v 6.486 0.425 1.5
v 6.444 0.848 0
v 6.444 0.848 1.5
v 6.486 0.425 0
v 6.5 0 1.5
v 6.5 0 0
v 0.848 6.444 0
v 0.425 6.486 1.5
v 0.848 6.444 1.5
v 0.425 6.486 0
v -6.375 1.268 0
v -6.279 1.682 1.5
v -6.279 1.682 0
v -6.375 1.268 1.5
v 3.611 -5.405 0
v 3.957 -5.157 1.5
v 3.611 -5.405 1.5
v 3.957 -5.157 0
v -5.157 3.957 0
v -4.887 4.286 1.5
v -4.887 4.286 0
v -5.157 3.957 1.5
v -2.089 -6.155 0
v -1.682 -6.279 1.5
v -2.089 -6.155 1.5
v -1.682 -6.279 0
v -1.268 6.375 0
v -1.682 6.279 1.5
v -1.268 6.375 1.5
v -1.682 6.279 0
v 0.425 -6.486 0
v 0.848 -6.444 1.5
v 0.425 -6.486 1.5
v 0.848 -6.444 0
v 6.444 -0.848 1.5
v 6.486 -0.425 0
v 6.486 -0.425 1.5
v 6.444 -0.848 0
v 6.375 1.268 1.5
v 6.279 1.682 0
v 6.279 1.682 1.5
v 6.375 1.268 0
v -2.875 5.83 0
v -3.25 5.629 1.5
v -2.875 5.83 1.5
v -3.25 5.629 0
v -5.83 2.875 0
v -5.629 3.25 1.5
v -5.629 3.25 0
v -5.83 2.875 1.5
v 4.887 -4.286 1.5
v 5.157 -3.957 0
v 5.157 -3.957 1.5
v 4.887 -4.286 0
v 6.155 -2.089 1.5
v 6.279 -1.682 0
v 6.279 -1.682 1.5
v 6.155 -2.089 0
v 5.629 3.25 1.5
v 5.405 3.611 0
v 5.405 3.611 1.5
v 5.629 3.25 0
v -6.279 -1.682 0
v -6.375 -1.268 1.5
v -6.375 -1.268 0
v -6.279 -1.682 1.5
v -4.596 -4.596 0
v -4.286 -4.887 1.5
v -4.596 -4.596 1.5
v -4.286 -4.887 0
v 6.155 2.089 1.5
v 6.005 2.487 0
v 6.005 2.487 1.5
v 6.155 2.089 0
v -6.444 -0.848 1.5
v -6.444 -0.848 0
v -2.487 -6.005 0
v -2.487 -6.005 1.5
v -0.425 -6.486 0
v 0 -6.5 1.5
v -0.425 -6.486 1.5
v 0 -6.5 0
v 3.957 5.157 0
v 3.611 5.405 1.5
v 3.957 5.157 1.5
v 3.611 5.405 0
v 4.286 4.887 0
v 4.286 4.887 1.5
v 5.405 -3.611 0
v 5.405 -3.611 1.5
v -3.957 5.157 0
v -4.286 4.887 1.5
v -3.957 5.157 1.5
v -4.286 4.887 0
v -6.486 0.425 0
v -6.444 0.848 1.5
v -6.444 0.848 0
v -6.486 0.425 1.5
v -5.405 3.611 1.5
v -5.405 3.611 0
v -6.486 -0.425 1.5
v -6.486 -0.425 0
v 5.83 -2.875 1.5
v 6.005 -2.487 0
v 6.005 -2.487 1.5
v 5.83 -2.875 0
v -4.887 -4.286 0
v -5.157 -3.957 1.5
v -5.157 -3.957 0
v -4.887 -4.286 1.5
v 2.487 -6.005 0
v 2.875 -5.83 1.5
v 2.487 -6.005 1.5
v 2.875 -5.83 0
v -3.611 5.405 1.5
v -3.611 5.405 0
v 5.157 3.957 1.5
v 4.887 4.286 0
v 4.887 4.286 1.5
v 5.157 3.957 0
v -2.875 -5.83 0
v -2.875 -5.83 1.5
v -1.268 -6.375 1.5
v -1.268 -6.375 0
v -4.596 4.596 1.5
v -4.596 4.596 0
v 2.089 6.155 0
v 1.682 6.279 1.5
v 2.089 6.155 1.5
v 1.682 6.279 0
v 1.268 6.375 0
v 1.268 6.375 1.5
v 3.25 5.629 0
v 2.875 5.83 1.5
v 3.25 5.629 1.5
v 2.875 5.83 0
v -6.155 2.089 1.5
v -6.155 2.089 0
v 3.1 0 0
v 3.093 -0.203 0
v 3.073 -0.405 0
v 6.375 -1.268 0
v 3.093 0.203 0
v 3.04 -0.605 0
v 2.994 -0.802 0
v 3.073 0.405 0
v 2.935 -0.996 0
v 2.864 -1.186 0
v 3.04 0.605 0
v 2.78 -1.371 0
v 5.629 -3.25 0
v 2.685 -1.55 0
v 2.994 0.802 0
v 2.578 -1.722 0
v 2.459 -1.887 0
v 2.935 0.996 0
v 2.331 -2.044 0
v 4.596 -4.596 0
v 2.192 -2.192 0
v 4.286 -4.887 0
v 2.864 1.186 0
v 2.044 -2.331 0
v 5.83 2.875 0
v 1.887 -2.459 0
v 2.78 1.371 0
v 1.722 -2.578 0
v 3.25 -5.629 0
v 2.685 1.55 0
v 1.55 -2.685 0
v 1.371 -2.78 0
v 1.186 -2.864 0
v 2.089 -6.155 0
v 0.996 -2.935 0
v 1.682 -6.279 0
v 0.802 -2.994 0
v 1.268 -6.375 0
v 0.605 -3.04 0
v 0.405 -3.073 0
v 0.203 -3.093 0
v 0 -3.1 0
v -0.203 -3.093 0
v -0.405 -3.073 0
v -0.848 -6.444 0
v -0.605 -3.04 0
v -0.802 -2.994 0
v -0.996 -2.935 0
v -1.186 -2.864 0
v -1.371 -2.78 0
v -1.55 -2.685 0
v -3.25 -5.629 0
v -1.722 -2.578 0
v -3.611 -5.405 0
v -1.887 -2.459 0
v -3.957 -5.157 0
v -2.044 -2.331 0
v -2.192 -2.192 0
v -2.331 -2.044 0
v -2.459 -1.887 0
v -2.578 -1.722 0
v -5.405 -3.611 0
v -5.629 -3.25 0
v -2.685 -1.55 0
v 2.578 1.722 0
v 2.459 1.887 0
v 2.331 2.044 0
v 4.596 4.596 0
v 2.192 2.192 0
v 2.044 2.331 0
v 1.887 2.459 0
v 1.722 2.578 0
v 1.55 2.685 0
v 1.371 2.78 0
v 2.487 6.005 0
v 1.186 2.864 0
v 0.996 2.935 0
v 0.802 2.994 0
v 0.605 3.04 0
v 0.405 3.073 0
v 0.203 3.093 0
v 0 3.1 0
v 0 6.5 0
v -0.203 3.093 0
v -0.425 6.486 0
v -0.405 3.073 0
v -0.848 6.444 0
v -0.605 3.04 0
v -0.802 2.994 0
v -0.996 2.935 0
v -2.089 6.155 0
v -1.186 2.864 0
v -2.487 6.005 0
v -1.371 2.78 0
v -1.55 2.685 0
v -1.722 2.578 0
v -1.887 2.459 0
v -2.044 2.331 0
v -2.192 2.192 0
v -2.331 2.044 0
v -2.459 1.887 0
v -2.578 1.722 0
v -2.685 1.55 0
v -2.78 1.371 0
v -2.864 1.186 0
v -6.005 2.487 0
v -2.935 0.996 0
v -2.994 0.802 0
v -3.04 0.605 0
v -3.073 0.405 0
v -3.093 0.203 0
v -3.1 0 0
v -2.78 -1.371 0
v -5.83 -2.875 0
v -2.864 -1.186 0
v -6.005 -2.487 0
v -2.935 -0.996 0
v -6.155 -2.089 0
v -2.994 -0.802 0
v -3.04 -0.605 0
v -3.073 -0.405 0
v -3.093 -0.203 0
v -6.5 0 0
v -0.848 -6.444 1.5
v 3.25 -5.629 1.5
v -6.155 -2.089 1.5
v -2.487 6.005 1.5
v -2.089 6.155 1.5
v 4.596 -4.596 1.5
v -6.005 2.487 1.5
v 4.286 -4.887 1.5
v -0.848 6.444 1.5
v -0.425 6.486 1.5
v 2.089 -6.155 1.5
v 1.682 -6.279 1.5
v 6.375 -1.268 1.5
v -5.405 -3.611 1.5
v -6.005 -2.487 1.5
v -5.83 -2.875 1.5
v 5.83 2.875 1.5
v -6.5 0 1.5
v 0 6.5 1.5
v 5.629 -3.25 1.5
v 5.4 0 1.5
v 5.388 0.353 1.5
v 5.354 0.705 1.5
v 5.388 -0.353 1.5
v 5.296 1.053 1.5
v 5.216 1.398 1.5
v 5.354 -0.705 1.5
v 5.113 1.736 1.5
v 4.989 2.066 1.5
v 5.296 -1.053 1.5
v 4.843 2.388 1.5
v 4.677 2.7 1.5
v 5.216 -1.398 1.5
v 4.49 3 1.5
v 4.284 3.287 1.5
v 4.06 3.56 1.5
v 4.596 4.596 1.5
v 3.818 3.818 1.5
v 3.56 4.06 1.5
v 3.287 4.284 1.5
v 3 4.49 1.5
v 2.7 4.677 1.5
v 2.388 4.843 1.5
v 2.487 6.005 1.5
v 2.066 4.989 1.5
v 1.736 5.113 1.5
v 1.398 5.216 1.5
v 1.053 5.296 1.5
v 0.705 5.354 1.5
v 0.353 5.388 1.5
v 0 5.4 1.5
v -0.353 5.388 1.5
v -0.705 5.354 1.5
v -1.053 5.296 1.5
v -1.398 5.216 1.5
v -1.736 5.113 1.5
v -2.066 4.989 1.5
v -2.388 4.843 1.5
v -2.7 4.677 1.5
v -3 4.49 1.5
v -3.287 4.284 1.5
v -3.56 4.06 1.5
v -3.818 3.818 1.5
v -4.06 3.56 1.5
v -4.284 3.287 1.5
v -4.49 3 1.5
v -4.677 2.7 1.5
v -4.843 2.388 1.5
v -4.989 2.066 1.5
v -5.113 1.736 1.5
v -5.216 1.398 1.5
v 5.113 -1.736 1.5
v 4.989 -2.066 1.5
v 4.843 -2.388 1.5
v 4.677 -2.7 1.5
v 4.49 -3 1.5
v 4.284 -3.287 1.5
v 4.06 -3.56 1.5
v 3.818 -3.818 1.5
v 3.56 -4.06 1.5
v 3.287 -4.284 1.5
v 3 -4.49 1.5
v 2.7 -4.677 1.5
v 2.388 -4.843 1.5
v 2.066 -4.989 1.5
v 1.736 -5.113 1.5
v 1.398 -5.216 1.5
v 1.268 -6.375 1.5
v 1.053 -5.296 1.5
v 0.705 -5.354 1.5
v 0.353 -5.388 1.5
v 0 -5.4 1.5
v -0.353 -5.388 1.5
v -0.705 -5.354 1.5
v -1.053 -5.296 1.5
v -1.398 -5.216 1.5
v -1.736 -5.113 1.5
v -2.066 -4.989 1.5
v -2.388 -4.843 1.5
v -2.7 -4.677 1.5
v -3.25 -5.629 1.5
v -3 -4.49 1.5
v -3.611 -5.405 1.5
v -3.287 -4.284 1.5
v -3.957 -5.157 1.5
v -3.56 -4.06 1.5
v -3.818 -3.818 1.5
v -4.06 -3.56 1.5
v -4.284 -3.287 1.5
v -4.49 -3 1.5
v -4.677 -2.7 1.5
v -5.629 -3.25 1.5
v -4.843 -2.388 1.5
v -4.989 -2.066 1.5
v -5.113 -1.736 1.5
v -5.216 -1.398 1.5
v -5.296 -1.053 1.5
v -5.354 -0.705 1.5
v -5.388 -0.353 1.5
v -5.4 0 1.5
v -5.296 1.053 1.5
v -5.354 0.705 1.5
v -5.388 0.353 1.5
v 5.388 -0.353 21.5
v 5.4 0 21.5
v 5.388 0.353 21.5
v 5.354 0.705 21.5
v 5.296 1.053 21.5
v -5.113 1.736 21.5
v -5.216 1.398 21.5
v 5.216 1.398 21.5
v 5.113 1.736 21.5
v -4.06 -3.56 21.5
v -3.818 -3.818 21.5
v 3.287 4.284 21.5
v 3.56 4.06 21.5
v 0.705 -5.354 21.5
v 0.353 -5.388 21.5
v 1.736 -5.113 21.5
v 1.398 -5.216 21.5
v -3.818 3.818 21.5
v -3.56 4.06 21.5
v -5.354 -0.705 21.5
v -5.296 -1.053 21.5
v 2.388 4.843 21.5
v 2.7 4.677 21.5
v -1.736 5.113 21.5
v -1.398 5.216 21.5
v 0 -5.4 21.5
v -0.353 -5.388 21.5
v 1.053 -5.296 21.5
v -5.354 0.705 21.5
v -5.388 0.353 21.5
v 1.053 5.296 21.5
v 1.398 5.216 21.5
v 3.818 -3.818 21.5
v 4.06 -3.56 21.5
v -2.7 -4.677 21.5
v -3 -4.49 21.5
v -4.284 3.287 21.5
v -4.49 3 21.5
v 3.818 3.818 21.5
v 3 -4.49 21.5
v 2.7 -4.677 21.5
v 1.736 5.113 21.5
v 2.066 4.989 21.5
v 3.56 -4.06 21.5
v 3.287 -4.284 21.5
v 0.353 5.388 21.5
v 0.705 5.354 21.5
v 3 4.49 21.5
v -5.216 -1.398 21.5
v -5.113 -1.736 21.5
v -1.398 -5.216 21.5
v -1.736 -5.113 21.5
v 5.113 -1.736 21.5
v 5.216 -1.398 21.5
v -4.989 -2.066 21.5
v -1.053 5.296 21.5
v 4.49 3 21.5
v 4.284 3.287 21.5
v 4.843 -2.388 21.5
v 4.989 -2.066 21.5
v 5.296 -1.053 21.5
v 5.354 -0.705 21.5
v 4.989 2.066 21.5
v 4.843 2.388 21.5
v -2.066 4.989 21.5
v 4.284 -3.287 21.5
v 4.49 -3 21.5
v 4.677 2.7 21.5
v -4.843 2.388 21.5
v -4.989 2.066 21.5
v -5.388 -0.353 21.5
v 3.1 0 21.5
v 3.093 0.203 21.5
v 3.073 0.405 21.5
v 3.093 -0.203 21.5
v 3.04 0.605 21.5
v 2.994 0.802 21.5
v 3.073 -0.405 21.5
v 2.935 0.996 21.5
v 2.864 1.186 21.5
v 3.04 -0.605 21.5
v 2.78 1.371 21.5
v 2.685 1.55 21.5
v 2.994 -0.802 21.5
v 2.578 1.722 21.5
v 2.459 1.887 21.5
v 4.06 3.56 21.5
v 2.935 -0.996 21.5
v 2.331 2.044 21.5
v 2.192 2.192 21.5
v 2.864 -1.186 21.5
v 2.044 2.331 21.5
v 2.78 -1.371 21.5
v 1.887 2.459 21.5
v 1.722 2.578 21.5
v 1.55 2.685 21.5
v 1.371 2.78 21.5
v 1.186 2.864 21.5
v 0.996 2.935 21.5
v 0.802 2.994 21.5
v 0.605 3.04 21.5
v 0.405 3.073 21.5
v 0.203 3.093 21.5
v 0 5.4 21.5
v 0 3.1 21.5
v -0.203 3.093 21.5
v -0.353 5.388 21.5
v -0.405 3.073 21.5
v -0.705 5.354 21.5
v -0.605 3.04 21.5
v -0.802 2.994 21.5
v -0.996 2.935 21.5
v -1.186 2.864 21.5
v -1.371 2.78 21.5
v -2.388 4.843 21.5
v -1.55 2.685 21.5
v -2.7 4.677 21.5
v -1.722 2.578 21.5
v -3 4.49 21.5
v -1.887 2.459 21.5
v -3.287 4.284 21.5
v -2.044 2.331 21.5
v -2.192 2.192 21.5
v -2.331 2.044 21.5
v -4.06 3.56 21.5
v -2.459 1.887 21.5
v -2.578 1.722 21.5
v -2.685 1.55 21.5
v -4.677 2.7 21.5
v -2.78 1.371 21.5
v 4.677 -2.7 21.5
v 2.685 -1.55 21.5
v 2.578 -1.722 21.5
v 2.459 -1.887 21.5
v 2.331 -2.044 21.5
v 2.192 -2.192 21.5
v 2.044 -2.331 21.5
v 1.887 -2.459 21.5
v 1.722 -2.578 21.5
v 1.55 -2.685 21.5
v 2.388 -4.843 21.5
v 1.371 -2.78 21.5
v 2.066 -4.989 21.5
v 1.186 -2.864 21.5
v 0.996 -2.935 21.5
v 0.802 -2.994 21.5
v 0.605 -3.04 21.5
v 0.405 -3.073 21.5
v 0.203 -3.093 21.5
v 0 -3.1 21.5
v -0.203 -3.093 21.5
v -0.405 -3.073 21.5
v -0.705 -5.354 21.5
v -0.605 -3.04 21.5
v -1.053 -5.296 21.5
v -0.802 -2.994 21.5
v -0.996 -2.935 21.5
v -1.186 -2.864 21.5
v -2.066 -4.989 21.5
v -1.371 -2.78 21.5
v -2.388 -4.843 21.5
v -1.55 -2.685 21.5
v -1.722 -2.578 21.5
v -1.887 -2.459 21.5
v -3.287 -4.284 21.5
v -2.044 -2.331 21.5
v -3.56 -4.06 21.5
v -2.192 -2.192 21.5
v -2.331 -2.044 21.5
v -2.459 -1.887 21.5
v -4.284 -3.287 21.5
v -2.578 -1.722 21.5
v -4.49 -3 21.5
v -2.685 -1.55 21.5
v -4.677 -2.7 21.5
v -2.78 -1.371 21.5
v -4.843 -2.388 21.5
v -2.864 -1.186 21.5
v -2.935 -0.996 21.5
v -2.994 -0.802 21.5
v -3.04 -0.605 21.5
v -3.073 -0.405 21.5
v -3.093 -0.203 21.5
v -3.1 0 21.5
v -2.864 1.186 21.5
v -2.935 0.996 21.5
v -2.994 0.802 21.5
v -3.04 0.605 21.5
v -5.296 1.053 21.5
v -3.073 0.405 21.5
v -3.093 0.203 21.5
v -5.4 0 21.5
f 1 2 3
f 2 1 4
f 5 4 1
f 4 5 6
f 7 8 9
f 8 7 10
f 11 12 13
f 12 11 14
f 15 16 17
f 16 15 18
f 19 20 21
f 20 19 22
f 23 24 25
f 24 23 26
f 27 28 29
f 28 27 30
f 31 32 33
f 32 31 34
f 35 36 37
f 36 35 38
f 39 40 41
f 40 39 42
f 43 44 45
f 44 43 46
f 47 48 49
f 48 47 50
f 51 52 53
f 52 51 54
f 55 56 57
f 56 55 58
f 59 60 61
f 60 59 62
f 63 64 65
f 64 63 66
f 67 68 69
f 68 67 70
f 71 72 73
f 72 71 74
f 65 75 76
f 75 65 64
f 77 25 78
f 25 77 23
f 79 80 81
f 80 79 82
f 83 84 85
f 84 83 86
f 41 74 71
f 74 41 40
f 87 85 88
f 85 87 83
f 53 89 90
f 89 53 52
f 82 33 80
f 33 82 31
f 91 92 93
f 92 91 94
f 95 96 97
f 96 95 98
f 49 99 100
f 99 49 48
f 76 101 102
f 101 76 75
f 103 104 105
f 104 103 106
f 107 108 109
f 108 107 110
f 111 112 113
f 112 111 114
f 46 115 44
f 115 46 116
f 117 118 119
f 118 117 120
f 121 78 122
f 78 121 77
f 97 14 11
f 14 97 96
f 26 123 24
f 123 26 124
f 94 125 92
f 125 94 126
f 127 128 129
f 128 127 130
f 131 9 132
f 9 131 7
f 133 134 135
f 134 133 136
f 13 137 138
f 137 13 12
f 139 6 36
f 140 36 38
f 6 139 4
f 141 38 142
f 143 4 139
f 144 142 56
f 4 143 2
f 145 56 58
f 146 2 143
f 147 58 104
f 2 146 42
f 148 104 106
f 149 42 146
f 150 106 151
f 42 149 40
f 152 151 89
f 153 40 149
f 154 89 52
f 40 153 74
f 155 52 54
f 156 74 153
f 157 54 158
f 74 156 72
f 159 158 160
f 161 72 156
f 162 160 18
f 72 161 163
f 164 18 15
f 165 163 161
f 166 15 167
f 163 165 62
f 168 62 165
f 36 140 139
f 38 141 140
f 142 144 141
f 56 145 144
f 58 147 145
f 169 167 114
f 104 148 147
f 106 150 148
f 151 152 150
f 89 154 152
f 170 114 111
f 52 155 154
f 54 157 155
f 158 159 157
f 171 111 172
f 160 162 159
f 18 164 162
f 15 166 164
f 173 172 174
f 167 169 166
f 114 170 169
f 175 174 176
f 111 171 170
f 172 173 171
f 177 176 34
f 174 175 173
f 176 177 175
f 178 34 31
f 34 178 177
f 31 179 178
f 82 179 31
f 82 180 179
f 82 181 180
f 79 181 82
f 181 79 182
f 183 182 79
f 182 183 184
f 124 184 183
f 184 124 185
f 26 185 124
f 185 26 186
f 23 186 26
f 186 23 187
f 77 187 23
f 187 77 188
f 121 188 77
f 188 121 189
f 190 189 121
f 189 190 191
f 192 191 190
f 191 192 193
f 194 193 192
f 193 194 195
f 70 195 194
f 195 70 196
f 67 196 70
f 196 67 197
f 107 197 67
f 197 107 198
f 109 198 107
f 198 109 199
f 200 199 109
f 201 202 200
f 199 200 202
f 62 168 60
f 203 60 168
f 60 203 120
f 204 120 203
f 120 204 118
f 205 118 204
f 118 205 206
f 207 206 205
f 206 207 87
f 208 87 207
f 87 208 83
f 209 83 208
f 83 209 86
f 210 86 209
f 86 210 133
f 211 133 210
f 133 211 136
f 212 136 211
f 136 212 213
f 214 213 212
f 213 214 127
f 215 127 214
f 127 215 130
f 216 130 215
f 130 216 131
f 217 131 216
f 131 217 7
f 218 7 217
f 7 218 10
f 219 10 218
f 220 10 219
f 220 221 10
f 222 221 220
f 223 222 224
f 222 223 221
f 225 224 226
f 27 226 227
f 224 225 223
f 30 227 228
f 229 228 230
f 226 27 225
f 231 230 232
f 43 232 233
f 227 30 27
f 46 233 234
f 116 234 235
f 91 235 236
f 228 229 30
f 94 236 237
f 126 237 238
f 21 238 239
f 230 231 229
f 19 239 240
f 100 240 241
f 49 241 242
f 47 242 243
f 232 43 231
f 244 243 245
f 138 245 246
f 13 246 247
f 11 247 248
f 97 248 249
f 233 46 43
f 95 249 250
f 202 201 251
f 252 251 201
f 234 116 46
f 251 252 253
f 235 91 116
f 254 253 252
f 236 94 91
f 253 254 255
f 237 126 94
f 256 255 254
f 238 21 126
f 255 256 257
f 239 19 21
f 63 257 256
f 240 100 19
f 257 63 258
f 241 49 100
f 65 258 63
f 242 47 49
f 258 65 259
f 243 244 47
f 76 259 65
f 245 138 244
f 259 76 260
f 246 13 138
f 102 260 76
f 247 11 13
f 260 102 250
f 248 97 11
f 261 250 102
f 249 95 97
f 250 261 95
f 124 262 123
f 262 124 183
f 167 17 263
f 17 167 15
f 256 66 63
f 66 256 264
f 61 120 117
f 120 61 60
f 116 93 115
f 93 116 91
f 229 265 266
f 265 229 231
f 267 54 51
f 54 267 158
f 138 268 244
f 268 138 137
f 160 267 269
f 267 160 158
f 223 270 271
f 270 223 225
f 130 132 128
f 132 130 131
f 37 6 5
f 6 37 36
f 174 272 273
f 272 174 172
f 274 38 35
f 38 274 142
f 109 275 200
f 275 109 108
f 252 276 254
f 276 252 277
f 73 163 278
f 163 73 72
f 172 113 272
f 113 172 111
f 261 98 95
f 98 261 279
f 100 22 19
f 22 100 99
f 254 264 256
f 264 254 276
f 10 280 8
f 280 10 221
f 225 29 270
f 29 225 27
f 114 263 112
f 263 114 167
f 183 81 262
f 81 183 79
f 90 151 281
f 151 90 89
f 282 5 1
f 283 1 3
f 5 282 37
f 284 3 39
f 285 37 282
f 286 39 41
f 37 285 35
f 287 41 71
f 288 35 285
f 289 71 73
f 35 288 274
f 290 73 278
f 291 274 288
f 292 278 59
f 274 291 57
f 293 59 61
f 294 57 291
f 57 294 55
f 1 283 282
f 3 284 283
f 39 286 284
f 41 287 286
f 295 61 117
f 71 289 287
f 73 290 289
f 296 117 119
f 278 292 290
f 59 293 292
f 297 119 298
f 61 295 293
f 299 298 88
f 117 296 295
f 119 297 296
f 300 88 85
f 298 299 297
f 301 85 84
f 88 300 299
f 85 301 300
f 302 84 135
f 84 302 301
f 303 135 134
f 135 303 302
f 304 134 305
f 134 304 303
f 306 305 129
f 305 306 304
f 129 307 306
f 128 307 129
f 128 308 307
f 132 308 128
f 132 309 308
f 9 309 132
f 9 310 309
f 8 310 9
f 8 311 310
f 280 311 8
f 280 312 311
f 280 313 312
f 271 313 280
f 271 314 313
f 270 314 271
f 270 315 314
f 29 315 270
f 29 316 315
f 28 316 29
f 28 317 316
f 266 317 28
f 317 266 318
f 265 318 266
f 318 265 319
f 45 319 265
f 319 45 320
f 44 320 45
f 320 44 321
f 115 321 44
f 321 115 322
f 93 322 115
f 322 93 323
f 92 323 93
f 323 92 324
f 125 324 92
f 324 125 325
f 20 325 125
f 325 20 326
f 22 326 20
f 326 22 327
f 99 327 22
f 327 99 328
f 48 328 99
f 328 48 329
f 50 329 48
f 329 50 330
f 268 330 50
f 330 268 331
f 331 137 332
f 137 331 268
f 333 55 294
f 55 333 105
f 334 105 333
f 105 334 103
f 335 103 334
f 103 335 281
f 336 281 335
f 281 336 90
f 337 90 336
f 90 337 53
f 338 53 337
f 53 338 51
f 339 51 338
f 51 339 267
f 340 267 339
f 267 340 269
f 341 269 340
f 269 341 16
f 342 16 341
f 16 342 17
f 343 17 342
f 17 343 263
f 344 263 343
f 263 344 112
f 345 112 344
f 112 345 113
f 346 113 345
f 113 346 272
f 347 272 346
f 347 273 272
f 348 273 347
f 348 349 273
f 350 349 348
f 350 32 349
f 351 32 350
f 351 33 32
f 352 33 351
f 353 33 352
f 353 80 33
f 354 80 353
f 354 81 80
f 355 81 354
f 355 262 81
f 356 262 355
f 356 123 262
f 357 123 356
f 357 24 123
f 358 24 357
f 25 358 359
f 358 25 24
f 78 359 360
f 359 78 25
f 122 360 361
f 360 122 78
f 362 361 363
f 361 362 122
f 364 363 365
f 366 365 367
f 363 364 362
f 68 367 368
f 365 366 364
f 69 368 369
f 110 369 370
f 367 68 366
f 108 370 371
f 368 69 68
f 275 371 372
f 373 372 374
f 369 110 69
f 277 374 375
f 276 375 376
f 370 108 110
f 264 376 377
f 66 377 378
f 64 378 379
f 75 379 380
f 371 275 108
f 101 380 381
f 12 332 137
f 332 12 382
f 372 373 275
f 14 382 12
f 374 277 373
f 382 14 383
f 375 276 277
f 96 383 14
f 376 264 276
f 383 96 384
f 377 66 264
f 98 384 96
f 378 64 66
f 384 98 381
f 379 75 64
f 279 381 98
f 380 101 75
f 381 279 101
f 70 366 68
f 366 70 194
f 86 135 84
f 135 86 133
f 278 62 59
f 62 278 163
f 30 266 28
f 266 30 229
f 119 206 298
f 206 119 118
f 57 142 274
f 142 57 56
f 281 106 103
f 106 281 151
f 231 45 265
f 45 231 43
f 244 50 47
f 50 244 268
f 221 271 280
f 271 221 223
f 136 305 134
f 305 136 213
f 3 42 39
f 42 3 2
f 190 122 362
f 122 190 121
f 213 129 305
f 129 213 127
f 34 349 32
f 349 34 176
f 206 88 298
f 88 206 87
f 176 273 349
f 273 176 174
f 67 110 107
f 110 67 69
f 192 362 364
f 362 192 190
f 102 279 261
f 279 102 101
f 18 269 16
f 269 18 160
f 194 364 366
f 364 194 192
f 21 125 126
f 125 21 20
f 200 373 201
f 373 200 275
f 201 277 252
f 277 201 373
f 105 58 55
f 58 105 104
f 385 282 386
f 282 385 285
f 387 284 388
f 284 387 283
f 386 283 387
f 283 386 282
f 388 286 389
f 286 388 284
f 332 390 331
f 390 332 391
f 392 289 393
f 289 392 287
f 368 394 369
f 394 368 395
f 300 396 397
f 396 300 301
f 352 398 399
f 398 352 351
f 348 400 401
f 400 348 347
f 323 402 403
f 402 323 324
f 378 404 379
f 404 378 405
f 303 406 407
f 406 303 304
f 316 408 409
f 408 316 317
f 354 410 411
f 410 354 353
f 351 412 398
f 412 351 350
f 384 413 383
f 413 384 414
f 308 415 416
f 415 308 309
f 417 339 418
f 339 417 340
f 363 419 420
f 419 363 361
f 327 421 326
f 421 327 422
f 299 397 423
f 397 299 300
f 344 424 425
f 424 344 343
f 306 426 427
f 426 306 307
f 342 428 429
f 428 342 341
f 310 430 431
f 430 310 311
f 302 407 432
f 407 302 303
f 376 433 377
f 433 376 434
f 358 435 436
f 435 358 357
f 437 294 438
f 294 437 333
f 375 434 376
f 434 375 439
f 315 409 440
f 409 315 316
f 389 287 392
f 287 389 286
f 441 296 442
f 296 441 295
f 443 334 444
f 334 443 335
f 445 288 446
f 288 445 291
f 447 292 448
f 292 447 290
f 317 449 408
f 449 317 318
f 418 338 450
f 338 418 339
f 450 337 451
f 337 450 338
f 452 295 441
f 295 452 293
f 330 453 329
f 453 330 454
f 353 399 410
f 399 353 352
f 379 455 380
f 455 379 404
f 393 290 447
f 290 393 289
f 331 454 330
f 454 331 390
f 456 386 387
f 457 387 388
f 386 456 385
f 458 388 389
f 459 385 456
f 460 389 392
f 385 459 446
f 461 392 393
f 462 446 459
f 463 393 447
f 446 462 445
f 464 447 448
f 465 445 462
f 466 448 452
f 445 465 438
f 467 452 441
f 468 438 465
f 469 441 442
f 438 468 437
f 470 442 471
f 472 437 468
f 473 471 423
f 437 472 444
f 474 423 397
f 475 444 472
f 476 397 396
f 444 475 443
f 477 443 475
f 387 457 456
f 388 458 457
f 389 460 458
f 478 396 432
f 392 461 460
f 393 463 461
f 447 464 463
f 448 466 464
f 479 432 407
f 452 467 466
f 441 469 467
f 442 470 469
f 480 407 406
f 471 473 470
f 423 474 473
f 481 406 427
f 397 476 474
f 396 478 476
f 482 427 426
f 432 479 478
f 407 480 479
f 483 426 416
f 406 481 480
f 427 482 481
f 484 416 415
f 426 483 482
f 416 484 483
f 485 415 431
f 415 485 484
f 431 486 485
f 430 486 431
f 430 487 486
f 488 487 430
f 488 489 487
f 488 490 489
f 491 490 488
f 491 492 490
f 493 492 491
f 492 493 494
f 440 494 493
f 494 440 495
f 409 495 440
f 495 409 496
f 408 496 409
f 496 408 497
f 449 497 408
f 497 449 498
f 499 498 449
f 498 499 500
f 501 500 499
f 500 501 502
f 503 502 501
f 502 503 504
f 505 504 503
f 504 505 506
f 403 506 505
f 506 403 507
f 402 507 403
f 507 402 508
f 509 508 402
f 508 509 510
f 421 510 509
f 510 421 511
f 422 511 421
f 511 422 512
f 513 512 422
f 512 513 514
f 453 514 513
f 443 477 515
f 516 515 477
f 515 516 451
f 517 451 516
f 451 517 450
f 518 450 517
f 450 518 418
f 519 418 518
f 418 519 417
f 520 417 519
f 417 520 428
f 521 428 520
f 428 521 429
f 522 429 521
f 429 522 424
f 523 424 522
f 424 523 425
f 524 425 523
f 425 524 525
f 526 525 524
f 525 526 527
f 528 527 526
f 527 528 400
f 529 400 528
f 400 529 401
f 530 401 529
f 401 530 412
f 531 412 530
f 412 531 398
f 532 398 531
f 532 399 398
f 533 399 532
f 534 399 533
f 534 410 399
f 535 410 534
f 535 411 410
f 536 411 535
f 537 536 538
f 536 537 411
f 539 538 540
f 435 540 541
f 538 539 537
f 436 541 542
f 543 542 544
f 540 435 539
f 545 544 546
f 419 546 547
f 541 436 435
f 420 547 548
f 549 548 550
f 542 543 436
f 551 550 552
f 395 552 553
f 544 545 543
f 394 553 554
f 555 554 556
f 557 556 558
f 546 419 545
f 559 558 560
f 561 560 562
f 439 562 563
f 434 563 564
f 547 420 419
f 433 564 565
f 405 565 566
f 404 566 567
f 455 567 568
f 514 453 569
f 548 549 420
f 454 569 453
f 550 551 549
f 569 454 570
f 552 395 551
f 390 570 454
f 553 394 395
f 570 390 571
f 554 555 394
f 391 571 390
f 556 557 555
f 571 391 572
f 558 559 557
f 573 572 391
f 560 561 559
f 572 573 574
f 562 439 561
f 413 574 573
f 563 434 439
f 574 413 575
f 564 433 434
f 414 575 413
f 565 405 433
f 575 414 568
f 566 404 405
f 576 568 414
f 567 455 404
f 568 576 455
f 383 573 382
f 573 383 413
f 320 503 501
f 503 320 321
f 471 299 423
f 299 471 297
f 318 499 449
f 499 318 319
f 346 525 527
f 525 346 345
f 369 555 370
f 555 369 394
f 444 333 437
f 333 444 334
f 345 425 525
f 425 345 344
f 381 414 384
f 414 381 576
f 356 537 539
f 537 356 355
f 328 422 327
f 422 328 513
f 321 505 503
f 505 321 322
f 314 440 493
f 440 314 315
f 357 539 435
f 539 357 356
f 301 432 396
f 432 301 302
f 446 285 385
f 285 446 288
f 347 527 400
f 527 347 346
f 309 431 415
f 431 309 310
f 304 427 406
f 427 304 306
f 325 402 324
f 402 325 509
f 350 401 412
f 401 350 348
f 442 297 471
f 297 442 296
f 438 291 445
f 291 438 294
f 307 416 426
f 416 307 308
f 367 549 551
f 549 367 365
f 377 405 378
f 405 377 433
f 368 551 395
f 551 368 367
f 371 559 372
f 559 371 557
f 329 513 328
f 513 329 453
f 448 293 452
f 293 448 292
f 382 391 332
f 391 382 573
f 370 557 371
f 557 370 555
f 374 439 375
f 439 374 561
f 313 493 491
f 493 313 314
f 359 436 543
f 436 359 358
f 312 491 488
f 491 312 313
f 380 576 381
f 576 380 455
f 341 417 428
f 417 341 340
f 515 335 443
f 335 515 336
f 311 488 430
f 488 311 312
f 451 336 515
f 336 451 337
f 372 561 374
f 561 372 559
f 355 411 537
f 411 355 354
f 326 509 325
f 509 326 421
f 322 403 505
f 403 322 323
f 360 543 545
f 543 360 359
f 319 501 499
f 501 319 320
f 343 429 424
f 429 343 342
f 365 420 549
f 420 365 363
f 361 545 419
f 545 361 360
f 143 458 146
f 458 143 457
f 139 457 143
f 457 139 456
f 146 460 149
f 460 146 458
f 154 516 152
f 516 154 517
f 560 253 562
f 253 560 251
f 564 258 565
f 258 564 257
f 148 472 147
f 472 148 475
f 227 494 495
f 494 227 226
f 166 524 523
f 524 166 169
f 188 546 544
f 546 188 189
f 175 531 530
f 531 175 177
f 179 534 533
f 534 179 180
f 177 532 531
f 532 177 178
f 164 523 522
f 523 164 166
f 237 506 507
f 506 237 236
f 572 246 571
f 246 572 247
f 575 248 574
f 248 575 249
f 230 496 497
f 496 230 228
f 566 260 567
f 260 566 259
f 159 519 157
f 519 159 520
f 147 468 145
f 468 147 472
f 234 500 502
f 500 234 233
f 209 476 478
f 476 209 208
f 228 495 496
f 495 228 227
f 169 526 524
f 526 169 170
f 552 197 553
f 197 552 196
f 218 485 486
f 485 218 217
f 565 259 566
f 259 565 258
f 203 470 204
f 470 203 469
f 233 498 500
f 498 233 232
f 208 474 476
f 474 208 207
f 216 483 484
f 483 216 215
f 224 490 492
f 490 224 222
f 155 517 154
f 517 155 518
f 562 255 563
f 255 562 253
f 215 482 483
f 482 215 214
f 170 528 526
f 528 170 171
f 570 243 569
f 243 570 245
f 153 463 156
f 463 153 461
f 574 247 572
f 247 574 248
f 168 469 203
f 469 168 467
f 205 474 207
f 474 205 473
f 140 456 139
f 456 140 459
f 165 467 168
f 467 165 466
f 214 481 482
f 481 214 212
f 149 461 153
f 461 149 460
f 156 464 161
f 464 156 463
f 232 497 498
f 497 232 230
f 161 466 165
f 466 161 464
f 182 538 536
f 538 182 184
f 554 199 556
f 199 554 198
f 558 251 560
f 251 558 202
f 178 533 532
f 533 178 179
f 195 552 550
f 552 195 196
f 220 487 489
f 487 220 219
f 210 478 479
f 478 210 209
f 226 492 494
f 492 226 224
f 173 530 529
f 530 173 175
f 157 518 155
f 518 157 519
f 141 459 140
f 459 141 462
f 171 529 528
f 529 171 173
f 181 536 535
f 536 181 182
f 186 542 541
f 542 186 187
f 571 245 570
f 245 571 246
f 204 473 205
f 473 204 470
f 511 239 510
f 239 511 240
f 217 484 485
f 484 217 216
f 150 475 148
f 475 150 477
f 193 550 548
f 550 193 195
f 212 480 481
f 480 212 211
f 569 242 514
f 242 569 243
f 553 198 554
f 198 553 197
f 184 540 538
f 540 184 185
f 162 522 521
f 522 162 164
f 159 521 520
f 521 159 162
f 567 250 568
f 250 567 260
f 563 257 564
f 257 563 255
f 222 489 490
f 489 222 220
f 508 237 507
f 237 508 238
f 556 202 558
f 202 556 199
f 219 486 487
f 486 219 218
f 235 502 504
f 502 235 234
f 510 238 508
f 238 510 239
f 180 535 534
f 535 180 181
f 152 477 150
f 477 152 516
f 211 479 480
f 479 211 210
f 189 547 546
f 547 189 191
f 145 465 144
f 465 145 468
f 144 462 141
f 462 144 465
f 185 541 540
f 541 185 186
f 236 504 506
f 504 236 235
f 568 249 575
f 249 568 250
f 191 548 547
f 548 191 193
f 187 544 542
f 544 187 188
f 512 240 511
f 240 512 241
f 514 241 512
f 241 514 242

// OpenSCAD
// Adapter sleeve: 0.2 mL PCR tube in a 1.5 mL rack hole
// Print orientation: collar down on the bed, sleeve body up (+Z)

$fn = 96;

// ---- Dimensions (mm) ----
collar_d      = 13;    // collar outer diameter
collar_h      = 1.5;   // collar thickness (z = 0 to 1.5)
sleeve_od     = 10.8;  // sleeve body outer diameter
sleeve_top_z  = 21.5;  // top of sleeve body
bore_d        = 6.2;   // through-bore diameter
eps           = 0.5;   // cutter overshoot past faces

// ---- Model ----
difference() {
    union() {
        // Collar
        cylinder(d = collar_d, h = collar_h);
        // Sleeve body, overlapping slightly into the collar for a clean union
        translate([0, 0, collar_h - 0.01])
            cylinder(d = sleeve_od, h = sleeve_top_z - collar_h + 0.01);
    }
    // Full-height bore, open at both ends
    translate([0, 0, -eps])
        cylinder(d = bore_d, h = sleeve_top_z + 2 * eps);
}
